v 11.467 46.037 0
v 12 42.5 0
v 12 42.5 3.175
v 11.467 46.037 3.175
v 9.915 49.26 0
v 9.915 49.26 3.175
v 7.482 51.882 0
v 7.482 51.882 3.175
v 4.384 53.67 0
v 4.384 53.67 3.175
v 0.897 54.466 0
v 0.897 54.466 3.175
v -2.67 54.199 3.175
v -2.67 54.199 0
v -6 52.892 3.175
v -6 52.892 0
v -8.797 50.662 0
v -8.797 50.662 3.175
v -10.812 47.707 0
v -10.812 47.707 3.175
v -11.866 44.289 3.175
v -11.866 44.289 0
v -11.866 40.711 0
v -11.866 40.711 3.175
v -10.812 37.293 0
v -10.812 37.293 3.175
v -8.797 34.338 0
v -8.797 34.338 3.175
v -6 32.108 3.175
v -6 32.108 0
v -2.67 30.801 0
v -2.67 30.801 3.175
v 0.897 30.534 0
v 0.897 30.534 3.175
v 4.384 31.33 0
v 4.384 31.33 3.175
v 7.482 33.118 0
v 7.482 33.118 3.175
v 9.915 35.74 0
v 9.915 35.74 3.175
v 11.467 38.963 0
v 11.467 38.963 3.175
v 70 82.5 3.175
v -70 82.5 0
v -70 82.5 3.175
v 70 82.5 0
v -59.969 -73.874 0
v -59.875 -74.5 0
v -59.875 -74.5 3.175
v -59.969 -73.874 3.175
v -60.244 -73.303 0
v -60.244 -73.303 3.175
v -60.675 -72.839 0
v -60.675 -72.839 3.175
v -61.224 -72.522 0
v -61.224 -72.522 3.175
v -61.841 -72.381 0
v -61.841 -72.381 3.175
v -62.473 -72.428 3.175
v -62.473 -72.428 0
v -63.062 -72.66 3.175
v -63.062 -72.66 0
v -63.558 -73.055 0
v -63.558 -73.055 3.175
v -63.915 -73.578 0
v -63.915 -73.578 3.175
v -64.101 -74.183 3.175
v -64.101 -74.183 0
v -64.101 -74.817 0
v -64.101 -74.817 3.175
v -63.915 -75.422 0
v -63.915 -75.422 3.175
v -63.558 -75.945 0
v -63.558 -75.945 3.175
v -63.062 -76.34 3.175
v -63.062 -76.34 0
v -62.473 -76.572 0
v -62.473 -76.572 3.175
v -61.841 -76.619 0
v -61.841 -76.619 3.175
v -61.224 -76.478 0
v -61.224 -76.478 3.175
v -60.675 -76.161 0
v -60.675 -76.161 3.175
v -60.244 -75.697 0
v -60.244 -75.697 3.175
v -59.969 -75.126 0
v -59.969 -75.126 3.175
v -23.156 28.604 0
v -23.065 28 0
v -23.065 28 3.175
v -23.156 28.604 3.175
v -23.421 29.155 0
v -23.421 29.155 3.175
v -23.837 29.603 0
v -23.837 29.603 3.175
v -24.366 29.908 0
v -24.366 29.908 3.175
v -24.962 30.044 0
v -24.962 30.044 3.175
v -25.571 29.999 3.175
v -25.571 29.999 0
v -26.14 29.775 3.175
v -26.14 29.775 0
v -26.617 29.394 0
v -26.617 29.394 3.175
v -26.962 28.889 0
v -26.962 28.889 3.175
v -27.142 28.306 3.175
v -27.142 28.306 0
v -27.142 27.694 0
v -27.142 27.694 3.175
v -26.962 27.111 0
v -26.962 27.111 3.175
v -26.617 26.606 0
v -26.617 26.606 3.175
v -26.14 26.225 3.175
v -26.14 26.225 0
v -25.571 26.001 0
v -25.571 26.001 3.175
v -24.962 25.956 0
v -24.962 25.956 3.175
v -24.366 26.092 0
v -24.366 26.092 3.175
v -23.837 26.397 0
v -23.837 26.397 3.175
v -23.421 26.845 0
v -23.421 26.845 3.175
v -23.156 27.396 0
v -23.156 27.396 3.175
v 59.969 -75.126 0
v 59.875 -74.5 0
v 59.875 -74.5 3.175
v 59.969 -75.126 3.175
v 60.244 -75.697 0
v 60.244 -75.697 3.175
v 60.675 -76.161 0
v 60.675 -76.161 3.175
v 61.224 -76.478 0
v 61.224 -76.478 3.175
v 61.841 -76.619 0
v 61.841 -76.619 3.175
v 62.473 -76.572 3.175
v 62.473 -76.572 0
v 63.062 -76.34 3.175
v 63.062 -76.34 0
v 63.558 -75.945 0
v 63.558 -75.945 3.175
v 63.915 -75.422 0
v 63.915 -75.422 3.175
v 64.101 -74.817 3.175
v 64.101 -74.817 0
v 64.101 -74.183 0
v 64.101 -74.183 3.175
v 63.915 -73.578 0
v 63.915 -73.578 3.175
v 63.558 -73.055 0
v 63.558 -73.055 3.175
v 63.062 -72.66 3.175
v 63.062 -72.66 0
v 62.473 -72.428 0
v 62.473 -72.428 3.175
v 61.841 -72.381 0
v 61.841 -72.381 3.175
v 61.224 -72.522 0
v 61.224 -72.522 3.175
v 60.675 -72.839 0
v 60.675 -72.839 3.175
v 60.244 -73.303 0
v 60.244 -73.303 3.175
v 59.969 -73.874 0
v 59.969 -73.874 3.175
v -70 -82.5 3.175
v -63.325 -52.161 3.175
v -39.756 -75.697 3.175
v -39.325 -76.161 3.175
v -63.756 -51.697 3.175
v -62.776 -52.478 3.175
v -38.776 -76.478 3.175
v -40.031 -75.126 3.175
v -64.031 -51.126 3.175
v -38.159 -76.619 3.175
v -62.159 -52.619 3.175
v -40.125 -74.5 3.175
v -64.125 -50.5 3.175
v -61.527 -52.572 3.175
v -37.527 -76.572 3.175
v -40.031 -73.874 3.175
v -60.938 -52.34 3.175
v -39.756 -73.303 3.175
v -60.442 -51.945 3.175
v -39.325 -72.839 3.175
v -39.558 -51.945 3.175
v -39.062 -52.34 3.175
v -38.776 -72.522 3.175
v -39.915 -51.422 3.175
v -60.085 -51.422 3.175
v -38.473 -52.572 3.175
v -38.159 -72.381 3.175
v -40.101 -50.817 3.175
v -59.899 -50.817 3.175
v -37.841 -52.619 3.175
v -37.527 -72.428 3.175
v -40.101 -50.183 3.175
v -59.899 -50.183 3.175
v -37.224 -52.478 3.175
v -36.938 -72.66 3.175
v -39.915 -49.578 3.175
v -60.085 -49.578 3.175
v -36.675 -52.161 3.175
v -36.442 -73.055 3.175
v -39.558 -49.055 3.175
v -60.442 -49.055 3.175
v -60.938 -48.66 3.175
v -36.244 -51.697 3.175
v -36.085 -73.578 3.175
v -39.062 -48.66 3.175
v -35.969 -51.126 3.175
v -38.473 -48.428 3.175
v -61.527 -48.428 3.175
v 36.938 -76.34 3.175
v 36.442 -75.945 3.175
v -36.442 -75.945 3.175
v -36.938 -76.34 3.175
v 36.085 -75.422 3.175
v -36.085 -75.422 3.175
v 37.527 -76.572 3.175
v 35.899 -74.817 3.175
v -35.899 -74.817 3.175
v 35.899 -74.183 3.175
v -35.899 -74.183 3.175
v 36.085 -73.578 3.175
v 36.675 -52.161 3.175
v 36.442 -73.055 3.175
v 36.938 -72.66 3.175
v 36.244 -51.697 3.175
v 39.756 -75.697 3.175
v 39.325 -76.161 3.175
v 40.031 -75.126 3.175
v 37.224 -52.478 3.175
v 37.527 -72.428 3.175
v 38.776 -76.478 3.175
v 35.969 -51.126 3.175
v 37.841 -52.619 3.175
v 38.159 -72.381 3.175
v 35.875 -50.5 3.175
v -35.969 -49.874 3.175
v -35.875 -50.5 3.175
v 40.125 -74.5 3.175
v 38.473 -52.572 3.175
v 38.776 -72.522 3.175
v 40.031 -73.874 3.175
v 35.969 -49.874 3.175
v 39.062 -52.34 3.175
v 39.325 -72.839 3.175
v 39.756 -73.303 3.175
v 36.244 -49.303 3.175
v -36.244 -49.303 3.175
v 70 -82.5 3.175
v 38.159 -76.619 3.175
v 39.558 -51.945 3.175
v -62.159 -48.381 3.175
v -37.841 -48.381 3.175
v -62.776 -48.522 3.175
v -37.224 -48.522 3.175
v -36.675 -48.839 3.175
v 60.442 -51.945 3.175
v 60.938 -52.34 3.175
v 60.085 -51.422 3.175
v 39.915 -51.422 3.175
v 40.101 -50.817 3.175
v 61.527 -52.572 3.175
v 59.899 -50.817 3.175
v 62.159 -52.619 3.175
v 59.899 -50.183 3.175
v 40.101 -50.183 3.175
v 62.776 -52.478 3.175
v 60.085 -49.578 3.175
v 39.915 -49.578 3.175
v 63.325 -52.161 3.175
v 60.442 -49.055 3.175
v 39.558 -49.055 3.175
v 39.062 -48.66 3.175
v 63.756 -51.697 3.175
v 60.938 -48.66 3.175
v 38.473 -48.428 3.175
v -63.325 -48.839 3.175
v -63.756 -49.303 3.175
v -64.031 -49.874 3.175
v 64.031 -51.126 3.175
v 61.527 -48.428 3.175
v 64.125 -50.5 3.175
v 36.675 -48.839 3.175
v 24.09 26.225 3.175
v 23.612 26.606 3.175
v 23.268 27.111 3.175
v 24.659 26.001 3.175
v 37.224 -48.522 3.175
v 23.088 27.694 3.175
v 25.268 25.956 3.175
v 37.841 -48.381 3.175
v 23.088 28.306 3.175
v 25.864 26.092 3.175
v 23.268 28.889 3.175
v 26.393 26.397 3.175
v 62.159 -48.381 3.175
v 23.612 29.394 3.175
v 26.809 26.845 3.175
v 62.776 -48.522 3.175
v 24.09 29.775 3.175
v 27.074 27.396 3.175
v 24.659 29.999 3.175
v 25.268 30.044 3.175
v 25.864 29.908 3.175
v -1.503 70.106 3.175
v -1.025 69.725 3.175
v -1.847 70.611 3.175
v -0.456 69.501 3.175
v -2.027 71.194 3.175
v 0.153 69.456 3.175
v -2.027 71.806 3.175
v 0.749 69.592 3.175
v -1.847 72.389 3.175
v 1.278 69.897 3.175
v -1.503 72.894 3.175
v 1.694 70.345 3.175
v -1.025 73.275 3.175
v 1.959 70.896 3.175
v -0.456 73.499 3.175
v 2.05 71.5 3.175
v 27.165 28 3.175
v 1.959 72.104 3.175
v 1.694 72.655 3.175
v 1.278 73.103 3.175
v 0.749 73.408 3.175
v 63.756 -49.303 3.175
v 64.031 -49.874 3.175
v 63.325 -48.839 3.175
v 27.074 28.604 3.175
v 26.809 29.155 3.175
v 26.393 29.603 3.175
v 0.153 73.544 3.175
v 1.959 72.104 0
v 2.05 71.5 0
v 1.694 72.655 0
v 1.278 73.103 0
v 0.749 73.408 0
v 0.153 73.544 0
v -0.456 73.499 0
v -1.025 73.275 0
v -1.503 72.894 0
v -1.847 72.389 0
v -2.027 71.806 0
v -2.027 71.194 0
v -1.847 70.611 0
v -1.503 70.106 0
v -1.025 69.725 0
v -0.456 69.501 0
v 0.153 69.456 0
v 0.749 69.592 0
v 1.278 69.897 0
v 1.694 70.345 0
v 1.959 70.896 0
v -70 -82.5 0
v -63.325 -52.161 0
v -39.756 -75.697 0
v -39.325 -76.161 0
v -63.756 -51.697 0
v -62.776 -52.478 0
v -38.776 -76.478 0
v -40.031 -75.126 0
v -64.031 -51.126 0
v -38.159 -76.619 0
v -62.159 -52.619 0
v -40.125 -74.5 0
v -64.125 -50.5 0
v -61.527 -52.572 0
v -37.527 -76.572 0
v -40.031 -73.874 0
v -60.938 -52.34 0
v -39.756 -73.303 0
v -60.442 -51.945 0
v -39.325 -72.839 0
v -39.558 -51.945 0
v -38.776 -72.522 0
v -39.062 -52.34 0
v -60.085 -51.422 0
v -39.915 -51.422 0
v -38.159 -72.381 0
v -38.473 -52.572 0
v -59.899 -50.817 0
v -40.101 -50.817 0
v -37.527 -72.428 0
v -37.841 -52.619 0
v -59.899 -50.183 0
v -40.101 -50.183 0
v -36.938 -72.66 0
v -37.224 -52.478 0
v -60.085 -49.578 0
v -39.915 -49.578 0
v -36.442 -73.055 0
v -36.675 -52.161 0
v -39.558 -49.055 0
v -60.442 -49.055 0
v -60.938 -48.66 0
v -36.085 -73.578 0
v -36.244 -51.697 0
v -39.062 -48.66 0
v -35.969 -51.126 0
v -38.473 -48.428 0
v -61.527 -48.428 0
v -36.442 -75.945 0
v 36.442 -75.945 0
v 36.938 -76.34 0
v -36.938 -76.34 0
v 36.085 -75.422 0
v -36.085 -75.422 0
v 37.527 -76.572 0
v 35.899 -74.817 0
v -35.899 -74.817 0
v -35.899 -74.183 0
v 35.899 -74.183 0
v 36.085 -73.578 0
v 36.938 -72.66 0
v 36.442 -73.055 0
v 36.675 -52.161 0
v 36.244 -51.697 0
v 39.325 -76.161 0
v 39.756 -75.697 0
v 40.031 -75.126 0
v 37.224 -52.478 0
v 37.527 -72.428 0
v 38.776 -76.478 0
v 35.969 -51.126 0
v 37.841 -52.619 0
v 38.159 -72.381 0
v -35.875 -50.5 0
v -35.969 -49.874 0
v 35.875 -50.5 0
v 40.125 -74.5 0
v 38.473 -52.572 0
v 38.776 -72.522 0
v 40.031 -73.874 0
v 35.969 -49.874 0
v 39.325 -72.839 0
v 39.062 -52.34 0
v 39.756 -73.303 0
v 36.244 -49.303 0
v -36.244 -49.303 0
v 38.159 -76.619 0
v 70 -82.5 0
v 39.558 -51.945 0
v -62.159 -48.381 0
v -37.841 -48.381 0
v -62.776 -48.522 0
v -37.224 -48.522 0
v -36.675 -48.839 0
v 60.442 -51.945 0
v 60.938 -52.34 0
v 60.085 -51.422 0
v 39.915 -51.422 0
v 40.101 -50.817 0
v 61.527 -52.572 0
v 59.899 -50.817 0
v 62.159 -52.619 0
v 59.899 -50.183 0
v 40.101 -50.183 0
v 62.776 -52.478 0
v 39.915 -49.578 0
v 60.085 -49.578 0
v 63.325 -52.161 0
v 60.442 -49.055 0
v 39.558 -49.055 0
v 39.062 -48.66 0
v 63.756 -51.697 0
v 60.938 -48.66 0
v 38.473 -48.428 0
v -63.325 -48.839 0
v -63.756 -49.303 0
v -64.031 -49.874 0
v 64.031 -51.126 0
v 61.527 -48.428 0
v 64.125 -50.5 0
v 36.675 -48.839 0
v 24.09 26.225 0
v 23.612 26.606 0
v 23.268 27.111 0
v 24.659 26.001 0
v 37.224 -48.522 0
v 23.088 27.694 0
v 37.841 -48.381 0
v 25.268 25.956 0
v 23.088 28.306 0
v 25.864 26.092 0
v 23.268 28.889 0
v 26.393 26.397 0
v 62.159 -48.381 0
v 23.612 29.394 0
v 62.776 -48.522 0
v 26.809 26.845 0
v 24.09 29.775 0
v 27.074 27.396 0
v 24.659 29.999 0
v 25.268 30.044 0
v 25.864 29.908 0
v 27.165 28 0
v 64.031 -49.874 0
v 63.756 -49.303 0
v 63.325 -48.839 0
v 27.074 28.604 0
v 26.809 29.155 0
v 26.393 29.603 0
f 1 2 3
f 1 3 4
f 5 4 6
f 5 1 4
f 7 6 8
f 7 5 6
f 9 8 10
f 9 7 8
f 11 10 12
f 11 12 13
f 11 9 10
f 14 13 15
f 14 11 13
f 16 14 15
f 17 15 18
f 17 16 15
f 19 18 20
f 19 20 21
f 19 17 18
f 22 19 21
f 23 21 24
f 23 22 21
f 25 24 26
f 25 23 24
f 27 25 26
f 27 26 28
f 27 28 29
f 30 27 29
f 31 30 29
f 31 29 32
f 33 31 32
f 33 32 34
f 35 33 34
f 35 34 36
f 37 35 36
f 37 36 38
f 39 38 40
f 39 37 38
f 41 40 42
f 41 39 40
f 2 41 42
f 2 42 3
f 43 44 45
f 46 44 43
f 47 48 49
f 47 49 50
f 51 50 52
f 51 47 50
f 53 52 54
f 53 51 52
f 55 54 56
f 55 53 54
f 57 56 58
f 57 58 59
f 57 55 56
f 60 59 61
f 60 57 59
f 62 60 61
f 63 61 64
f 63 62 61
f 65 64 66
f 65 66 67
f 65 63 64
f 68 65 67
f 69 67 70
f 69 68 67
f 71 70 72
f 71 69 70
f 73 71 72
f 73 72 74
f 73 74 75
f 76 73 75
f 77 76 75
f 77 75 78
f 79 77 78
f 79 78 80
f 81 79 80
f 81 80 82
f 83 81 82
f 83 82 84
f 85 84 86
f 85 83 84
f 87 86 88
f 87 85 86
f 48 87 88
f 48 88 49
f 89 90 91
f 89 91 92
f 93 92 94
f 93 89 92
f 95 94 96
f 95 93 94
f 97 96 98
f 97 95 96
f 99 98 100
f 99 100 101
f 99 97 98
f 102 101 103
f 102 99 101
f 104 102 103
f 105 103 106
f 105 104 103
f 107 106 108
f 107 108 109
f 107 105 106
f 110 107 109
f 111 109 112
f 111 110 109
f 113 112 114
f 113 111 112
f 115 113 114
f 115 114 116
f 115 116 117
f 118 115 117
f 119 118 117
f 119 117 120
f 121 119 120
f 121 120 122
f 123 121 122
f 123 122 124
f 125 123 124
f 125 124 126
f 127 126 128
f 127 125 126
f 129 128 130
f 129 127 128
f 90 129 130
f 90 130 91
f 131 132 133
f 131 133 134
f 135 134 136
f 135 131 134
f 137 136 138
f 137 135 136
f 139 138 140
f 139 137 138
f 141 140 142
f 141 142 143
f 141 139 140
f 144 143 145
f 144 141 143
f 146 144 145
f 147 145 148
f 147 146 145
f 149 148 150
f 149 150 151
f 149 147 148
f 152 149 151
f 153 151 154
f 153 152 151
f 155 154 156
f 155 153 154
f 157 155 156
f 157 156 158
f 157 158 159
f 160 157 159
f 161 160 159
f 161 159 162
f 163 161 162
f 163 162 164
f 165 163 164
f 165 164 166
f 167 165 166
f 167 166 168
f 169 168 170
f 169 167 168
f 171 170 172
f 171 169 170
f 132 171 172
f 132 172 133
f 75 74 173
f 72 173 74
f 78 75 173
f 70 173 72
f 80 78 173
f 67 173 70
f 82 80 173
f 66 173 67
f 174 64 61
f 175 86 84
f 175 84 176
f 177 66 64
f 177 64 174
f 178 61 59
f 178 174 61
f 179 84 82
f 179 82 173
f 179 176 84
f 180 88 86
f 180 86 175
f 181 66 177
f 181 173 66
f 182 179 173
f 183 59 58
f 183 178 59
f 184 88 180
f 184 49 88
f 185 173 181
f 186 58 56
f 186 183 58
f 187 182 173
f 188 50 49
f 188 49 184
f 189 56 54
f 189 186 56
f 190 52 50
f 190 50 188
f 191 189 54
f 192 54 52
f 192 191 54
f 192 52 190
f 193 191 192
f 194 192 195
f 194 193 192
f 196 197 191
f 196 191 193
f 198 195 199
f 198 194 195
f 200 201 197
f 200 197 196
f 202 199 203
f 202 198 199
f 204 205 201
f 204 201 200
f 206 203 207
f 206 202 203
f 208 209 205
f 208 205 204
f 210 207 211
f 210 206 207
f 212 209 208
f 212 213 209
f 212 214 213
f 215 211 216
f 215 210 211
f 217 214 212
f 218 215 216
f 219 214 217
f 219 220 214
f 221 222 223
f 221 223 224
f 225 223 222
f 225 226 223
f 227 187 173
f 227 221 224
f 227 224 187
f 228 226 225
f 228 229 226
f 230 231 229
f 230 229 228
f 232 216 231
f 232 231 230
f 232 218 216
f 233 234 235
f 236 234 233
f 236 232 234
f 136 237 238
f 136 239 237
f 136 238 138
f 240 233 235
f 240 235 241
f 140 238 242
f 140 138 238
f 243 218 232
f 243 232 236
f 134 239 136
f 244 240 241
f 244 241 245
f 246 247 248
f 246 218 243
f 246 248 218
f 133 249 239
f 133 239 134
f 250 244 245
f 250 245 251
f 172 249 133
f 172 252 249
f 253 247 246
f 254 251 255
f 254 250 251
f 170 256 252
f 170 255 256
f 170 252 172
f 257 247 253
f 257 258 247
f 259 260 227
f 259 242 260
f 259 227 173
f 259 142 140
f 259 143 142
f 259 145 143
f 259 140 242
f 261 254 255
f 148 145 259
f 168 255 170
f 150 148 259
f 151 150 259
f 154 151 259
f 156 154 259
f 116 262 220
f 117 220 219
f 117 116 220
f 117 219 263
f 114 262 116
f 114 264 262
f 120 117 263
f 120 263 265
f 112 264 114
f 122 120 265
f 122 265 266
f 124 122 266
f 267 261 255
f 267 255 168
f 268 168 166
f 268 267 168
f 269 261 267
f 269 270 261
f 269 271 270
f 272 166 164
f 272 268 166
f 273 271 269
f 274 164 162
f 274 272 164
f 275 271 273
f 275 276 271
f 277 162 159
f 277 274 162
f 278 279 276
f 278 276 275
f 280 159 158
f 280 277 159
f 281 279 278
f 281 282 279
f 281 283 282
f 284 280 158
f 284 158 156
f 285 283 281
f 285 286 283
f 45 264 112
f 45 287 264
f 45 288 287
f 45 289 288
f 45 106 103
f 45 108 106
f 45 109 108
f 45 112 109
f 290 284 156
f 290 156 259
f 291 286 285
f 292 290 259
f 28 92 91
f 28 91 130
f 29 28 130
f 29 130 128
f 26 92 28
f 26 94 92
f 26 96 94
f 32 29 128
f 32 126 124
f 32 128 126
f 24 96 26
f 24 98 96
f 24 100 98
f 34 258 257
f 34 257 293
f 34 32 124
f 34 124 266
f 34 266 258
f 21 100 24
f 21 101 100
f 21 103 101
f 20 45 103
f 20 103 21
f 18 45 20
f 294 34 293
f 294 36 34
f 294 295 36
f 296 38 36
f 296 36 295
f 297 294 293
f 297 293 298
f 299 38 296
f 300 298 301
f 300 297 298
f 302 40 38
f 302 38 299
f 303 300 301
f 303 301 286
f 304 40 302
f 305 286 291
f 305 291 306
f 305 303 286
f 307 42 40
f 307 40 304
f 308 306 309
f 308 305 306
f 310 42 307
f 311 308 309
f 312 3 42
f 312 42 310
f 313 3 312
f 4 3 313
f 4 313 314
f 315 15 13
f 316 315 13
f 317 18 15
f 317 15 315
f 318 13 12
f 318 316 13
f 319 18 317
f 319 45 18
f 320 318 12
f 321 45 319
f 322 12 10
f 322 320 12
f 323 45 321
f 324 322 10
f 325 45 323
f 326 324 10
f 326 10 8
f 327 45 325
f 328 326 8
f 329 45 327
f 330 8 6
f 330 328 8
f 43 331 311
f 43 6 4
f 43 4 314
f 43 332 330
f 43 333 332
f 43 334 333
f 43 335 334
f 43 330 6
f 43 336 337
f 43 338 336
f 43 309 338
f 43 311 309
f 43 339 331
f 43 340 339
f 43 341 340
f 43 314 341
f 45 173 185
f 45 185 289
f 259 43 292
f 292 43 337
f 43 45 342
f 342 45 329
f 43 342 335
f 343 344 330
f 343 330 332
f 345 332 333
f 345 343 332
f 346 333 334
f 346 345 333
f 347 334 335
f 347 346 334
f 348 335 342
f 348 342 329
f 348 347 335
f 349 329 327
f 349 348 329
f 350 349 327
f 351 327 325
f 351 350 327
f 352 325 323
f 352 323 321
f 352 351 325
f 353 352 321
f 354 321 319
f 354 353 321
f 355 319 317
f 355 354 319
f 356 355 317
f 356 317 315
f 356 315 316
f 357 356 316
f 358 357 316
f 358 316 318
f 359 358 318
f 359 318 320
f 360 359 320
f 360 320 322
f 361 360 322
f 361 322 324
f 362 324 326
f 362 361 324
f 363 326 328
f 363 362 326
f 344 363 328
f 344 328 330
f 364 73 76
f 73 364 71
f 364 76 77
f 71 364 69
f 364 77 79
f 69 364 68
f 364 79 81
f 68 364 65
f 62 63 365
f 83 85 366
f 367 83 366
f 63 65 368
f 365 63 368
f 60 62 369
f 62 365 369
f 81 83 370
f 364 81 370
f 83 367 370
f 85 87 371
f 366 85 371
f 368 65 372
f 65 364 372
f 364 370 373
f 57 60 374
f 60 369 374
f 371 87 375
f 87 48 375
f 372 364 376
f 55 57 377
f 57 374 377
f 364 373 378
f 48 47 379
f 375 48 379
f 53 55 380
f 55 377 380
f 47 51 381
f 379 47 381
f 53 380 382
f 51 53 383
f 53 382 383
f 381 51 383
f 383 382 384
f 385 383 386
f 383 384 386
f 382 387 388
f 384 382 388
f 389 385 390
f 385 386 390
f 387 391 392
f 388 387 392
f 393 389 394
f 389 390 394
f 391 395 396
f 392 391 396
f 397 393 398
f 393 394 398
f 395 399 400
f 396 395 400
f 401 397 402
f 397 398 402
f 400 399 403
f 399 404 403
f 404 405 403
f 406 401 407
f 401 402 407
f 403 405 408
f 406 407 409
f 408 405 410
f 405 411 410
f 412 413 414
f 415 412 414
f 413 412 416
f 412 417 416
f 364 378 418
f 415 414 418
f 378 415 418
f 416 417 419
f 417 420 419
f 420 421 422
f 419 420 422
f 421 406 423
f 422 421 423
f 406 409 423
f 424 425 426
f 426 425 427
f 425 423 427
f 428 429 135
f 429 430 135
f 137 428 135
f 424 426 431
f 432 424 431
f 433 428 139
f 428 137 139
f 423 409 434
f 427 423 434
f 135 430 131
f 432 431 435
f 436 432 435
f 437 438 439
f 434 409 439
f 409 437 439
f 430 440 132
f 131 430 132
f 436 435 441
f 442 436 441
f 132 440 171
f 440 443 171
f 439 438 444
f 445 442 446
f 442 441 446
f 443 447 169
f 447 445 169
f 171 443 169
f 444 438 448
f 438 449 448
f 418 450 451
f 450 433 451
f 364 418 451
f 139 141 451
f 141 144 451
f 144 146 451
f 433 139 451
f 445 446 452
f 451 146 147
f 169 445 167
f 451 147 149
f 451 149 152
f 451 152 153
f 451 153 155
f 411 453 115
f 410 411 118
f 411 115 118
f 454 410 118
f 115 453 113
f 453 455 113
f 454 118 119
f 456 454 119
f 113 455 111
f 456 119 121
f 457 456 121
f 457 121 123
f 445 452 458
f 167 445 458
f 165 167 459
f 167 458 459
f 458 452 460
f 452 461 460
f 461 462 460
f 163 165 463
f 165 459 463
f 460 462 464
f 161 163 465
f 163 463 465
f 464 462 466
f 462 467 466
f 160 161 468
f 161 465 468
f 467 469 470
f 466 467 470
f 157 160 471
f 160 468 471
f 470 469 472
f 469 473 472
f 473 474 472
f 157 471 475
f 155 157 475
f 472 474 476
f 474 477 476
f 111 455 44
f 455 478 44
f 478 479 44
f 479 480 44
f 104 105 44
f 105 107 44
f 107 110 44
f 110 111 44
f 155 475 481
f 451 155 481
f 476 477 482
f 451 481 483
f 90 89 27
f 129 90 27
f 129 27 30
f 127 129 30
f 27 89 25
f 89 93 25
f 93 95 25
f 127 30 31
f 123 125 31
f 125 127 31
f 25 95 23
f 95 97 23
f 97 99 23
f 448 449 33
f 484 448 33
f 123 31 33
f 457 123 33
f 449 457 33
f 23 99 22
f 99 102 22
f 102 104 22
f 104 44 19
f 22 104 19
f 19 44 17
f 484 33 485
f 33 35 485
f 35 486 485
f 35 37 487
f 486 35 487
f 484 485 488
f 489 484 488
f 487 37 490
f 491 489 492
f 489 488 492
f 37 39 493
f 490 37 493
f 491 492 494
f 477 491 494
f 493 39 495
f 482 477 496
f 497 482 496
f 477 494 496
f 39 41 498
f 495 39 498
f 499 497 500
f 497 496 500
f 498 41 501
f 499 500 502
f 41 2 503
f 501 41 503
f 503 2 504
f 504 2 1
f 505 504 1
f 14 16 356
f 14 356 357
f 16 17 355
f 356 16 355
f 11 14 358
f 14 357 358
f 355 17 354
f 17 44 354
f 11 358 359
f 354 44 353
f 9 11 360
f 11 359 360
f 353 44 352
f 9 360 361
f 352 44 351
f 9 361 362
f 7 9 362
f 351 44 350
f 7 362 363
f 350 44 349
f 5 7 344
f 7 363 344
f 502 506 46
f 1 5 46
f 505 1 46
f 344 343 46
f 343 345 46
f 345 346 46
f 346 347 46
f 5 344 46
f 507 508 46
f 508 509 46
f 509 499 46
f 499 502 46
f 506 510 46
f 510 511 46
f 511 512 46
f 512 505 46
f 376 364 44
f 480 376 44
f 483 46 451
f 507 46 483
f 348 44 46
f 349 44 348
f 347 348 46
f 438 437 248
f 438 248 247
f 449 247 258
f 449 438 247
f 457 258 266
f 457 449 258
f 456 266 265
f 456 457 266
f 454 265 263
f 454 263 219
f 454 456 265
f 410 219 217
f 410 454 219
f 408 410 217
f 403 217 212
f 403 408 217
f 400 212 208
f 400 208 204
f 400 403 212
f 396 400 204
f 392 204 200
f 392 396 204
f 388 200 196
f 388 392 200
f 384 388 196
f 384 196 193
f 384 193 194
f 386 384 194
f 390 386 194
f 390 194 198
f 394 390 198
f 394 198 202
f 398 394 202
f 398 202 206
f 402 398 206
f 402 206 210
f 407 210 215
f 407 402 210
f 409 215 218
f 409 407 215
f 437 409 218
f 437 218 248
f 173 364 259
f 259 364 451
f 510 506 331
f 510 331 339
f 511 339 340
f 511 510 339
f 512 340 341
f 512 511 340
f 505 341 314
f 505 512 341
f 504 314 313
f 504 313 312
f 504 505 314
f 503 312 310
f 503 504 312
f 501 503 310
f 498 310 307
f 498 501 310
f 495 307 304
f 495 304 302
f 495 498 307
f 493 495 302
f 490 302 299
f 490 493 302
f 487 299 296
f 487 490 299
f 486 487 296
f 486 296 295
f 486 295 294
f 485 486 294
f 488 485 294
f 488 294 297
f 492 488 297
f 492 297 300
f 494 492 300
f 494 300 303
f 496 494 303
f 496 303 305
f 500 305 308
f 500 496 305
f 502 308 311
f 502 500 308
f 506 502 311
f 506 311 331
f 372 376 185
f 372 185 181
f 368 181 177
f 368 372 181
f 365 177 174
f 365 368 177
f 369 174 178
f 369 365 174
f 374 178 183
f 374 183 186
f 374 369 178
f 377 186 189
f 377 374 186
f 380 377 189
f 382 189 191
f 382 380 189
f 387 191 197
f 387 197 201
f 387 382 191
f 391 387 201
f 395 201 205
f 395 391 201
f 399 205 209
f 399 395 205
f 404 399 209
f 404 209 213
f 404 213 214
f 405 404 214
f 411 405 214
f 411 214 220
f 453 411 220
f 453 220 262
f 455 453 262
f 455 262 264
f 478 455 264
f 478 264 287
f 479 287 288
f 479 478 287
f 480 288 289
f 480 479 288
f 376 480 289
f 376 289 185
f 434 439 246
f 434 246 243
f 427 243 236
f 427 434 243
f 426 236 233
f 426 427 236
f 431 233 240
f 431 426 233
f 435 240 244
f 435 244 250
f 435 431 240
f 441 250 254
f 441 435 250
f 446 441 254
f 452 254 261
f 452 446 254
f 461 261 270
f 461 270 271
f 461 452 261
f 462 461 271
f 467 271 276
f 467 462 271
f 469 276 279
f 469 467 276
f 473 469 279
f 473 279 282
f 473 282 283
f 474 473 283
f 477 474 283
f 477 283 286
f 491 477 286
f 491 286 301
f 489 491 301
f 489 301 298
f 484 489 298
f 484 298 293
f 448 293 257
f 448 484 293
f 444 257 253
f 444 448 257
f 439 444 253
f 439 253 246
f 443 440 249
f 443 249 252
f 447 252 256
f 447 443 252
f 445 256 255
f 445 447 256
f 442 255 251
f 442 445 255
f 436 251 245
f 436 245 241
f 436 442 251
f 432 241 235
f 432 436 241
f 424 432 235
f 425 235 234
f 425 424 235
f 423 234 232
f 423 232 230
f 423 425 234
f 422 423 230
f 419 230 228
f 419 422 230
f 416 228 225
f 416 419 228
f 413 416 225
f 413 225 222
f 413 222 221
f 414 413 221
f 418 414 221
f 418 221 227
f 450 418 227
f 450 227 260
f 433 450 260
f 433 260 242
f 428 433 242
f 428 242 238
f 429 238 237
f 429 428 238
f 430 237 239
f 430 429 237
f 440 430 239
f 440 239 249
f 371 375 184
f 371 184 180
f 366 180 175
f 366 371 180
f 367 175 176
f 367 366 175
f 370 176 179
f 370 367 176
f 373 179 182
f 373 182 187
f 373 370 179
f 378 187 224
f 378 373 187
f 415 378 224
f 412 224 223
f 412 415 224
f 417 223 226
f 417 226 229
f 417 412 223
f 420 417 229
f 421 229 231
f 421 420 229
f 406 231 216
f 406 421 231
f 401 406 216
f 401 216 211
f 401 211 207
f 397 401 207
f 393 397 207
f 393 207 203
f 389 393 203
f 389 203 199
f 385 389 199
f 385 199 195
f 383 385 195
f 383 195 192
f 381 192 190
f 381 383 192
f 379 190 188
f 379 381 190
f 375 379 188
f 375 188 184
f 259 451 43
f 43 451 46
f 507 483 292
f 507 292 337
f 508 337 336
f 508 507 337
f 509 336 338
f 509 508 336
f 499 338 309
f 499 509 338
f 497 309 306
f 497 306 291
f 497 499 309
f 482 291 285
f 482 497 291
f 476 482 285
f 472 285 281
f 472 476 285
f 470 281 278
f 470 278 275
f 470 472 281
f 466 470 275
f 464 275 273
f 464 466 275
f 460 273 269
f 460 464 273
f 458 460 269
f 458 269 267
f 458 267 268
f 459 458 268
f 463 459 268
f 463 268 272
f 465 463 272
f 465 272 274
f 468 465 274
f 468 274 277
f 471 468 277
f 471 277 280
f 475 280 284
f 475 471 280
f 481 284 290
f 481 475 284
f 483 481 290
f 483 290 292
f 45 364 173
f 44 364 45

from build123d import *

# Parameters (mm, degrees)
SKETCH1_W           = 140
SKETCH1_H           = 165
SKETCH1_R           = 2.05
SKETCH1_R_2         = 12
SKETCH1_R_3         = 2.125
BOSS_EXTRUDE1_DEPTH = 3.175


with BuildPart() as part:
    # Sketch1 → Boss-Extrude1 (new body)
    with BuildSketch(Plane.XY):
        Rectangle(SKETCH1_W, SKETCH1_H)
        with Locations((0, 71.5)):
            Circle(SKETCH1_R, mode=Mode.SUBTRACT)
        with Locations((25.11473671, 28)):
            Circle(SKETCH1_R, mode=Mode.SUBTRACT)
        with Locations((-25.11473671, 28)):
            Circle(SKETCH1_R, mode=Mode.SUBTRACT)
        with Locations((0, 42.5)):
            Circle(SKETCH1_R_2, mode=Mode.SUBTRACT)
        with Locations((-62, -74.5)):
            Circle(SKETCH1_R_3, mode=Mode.SUBTRACT)
        with Locations(Location((-38, -74.5, 0), (0, 0, 180))):
            Circle(SKETCH1_R_3, mode=Mode.SUBTRACT)
        with Locations((-38, -50.5)):
            Circle(SKETCH1_R_3, mode=Mode.SUBTRACT)
        with Locations(Location((-62, -50.5, 0), (0, 0, 180))):
            Circle(SKETCH1_R_3, mode=Mode.SUBTRACT)
        with Locations((38, -74.5)):
            Circle(SKETCH1_R_3, mode=Mode.SUBTRACT)
        with Locations(Location((62, -74.5, 0), (0, 0, 180))):
            Circle(SKETCH1_R_3, mode=Mode.SUBTRACT)
        with Locations((62, -50.5)):
            Circle(SKETCH1_R_3, mode=Mode.SUBTRACT)
        with Locations(Location((38, -50.5, 0), (0, 0, 180))):
            Circle(SKETCH1_R_3, mode=Mode.SUBTRACT)
    extrude(amount=BOSS_EXTRUDE1_DEPTH)


solid = part.part
